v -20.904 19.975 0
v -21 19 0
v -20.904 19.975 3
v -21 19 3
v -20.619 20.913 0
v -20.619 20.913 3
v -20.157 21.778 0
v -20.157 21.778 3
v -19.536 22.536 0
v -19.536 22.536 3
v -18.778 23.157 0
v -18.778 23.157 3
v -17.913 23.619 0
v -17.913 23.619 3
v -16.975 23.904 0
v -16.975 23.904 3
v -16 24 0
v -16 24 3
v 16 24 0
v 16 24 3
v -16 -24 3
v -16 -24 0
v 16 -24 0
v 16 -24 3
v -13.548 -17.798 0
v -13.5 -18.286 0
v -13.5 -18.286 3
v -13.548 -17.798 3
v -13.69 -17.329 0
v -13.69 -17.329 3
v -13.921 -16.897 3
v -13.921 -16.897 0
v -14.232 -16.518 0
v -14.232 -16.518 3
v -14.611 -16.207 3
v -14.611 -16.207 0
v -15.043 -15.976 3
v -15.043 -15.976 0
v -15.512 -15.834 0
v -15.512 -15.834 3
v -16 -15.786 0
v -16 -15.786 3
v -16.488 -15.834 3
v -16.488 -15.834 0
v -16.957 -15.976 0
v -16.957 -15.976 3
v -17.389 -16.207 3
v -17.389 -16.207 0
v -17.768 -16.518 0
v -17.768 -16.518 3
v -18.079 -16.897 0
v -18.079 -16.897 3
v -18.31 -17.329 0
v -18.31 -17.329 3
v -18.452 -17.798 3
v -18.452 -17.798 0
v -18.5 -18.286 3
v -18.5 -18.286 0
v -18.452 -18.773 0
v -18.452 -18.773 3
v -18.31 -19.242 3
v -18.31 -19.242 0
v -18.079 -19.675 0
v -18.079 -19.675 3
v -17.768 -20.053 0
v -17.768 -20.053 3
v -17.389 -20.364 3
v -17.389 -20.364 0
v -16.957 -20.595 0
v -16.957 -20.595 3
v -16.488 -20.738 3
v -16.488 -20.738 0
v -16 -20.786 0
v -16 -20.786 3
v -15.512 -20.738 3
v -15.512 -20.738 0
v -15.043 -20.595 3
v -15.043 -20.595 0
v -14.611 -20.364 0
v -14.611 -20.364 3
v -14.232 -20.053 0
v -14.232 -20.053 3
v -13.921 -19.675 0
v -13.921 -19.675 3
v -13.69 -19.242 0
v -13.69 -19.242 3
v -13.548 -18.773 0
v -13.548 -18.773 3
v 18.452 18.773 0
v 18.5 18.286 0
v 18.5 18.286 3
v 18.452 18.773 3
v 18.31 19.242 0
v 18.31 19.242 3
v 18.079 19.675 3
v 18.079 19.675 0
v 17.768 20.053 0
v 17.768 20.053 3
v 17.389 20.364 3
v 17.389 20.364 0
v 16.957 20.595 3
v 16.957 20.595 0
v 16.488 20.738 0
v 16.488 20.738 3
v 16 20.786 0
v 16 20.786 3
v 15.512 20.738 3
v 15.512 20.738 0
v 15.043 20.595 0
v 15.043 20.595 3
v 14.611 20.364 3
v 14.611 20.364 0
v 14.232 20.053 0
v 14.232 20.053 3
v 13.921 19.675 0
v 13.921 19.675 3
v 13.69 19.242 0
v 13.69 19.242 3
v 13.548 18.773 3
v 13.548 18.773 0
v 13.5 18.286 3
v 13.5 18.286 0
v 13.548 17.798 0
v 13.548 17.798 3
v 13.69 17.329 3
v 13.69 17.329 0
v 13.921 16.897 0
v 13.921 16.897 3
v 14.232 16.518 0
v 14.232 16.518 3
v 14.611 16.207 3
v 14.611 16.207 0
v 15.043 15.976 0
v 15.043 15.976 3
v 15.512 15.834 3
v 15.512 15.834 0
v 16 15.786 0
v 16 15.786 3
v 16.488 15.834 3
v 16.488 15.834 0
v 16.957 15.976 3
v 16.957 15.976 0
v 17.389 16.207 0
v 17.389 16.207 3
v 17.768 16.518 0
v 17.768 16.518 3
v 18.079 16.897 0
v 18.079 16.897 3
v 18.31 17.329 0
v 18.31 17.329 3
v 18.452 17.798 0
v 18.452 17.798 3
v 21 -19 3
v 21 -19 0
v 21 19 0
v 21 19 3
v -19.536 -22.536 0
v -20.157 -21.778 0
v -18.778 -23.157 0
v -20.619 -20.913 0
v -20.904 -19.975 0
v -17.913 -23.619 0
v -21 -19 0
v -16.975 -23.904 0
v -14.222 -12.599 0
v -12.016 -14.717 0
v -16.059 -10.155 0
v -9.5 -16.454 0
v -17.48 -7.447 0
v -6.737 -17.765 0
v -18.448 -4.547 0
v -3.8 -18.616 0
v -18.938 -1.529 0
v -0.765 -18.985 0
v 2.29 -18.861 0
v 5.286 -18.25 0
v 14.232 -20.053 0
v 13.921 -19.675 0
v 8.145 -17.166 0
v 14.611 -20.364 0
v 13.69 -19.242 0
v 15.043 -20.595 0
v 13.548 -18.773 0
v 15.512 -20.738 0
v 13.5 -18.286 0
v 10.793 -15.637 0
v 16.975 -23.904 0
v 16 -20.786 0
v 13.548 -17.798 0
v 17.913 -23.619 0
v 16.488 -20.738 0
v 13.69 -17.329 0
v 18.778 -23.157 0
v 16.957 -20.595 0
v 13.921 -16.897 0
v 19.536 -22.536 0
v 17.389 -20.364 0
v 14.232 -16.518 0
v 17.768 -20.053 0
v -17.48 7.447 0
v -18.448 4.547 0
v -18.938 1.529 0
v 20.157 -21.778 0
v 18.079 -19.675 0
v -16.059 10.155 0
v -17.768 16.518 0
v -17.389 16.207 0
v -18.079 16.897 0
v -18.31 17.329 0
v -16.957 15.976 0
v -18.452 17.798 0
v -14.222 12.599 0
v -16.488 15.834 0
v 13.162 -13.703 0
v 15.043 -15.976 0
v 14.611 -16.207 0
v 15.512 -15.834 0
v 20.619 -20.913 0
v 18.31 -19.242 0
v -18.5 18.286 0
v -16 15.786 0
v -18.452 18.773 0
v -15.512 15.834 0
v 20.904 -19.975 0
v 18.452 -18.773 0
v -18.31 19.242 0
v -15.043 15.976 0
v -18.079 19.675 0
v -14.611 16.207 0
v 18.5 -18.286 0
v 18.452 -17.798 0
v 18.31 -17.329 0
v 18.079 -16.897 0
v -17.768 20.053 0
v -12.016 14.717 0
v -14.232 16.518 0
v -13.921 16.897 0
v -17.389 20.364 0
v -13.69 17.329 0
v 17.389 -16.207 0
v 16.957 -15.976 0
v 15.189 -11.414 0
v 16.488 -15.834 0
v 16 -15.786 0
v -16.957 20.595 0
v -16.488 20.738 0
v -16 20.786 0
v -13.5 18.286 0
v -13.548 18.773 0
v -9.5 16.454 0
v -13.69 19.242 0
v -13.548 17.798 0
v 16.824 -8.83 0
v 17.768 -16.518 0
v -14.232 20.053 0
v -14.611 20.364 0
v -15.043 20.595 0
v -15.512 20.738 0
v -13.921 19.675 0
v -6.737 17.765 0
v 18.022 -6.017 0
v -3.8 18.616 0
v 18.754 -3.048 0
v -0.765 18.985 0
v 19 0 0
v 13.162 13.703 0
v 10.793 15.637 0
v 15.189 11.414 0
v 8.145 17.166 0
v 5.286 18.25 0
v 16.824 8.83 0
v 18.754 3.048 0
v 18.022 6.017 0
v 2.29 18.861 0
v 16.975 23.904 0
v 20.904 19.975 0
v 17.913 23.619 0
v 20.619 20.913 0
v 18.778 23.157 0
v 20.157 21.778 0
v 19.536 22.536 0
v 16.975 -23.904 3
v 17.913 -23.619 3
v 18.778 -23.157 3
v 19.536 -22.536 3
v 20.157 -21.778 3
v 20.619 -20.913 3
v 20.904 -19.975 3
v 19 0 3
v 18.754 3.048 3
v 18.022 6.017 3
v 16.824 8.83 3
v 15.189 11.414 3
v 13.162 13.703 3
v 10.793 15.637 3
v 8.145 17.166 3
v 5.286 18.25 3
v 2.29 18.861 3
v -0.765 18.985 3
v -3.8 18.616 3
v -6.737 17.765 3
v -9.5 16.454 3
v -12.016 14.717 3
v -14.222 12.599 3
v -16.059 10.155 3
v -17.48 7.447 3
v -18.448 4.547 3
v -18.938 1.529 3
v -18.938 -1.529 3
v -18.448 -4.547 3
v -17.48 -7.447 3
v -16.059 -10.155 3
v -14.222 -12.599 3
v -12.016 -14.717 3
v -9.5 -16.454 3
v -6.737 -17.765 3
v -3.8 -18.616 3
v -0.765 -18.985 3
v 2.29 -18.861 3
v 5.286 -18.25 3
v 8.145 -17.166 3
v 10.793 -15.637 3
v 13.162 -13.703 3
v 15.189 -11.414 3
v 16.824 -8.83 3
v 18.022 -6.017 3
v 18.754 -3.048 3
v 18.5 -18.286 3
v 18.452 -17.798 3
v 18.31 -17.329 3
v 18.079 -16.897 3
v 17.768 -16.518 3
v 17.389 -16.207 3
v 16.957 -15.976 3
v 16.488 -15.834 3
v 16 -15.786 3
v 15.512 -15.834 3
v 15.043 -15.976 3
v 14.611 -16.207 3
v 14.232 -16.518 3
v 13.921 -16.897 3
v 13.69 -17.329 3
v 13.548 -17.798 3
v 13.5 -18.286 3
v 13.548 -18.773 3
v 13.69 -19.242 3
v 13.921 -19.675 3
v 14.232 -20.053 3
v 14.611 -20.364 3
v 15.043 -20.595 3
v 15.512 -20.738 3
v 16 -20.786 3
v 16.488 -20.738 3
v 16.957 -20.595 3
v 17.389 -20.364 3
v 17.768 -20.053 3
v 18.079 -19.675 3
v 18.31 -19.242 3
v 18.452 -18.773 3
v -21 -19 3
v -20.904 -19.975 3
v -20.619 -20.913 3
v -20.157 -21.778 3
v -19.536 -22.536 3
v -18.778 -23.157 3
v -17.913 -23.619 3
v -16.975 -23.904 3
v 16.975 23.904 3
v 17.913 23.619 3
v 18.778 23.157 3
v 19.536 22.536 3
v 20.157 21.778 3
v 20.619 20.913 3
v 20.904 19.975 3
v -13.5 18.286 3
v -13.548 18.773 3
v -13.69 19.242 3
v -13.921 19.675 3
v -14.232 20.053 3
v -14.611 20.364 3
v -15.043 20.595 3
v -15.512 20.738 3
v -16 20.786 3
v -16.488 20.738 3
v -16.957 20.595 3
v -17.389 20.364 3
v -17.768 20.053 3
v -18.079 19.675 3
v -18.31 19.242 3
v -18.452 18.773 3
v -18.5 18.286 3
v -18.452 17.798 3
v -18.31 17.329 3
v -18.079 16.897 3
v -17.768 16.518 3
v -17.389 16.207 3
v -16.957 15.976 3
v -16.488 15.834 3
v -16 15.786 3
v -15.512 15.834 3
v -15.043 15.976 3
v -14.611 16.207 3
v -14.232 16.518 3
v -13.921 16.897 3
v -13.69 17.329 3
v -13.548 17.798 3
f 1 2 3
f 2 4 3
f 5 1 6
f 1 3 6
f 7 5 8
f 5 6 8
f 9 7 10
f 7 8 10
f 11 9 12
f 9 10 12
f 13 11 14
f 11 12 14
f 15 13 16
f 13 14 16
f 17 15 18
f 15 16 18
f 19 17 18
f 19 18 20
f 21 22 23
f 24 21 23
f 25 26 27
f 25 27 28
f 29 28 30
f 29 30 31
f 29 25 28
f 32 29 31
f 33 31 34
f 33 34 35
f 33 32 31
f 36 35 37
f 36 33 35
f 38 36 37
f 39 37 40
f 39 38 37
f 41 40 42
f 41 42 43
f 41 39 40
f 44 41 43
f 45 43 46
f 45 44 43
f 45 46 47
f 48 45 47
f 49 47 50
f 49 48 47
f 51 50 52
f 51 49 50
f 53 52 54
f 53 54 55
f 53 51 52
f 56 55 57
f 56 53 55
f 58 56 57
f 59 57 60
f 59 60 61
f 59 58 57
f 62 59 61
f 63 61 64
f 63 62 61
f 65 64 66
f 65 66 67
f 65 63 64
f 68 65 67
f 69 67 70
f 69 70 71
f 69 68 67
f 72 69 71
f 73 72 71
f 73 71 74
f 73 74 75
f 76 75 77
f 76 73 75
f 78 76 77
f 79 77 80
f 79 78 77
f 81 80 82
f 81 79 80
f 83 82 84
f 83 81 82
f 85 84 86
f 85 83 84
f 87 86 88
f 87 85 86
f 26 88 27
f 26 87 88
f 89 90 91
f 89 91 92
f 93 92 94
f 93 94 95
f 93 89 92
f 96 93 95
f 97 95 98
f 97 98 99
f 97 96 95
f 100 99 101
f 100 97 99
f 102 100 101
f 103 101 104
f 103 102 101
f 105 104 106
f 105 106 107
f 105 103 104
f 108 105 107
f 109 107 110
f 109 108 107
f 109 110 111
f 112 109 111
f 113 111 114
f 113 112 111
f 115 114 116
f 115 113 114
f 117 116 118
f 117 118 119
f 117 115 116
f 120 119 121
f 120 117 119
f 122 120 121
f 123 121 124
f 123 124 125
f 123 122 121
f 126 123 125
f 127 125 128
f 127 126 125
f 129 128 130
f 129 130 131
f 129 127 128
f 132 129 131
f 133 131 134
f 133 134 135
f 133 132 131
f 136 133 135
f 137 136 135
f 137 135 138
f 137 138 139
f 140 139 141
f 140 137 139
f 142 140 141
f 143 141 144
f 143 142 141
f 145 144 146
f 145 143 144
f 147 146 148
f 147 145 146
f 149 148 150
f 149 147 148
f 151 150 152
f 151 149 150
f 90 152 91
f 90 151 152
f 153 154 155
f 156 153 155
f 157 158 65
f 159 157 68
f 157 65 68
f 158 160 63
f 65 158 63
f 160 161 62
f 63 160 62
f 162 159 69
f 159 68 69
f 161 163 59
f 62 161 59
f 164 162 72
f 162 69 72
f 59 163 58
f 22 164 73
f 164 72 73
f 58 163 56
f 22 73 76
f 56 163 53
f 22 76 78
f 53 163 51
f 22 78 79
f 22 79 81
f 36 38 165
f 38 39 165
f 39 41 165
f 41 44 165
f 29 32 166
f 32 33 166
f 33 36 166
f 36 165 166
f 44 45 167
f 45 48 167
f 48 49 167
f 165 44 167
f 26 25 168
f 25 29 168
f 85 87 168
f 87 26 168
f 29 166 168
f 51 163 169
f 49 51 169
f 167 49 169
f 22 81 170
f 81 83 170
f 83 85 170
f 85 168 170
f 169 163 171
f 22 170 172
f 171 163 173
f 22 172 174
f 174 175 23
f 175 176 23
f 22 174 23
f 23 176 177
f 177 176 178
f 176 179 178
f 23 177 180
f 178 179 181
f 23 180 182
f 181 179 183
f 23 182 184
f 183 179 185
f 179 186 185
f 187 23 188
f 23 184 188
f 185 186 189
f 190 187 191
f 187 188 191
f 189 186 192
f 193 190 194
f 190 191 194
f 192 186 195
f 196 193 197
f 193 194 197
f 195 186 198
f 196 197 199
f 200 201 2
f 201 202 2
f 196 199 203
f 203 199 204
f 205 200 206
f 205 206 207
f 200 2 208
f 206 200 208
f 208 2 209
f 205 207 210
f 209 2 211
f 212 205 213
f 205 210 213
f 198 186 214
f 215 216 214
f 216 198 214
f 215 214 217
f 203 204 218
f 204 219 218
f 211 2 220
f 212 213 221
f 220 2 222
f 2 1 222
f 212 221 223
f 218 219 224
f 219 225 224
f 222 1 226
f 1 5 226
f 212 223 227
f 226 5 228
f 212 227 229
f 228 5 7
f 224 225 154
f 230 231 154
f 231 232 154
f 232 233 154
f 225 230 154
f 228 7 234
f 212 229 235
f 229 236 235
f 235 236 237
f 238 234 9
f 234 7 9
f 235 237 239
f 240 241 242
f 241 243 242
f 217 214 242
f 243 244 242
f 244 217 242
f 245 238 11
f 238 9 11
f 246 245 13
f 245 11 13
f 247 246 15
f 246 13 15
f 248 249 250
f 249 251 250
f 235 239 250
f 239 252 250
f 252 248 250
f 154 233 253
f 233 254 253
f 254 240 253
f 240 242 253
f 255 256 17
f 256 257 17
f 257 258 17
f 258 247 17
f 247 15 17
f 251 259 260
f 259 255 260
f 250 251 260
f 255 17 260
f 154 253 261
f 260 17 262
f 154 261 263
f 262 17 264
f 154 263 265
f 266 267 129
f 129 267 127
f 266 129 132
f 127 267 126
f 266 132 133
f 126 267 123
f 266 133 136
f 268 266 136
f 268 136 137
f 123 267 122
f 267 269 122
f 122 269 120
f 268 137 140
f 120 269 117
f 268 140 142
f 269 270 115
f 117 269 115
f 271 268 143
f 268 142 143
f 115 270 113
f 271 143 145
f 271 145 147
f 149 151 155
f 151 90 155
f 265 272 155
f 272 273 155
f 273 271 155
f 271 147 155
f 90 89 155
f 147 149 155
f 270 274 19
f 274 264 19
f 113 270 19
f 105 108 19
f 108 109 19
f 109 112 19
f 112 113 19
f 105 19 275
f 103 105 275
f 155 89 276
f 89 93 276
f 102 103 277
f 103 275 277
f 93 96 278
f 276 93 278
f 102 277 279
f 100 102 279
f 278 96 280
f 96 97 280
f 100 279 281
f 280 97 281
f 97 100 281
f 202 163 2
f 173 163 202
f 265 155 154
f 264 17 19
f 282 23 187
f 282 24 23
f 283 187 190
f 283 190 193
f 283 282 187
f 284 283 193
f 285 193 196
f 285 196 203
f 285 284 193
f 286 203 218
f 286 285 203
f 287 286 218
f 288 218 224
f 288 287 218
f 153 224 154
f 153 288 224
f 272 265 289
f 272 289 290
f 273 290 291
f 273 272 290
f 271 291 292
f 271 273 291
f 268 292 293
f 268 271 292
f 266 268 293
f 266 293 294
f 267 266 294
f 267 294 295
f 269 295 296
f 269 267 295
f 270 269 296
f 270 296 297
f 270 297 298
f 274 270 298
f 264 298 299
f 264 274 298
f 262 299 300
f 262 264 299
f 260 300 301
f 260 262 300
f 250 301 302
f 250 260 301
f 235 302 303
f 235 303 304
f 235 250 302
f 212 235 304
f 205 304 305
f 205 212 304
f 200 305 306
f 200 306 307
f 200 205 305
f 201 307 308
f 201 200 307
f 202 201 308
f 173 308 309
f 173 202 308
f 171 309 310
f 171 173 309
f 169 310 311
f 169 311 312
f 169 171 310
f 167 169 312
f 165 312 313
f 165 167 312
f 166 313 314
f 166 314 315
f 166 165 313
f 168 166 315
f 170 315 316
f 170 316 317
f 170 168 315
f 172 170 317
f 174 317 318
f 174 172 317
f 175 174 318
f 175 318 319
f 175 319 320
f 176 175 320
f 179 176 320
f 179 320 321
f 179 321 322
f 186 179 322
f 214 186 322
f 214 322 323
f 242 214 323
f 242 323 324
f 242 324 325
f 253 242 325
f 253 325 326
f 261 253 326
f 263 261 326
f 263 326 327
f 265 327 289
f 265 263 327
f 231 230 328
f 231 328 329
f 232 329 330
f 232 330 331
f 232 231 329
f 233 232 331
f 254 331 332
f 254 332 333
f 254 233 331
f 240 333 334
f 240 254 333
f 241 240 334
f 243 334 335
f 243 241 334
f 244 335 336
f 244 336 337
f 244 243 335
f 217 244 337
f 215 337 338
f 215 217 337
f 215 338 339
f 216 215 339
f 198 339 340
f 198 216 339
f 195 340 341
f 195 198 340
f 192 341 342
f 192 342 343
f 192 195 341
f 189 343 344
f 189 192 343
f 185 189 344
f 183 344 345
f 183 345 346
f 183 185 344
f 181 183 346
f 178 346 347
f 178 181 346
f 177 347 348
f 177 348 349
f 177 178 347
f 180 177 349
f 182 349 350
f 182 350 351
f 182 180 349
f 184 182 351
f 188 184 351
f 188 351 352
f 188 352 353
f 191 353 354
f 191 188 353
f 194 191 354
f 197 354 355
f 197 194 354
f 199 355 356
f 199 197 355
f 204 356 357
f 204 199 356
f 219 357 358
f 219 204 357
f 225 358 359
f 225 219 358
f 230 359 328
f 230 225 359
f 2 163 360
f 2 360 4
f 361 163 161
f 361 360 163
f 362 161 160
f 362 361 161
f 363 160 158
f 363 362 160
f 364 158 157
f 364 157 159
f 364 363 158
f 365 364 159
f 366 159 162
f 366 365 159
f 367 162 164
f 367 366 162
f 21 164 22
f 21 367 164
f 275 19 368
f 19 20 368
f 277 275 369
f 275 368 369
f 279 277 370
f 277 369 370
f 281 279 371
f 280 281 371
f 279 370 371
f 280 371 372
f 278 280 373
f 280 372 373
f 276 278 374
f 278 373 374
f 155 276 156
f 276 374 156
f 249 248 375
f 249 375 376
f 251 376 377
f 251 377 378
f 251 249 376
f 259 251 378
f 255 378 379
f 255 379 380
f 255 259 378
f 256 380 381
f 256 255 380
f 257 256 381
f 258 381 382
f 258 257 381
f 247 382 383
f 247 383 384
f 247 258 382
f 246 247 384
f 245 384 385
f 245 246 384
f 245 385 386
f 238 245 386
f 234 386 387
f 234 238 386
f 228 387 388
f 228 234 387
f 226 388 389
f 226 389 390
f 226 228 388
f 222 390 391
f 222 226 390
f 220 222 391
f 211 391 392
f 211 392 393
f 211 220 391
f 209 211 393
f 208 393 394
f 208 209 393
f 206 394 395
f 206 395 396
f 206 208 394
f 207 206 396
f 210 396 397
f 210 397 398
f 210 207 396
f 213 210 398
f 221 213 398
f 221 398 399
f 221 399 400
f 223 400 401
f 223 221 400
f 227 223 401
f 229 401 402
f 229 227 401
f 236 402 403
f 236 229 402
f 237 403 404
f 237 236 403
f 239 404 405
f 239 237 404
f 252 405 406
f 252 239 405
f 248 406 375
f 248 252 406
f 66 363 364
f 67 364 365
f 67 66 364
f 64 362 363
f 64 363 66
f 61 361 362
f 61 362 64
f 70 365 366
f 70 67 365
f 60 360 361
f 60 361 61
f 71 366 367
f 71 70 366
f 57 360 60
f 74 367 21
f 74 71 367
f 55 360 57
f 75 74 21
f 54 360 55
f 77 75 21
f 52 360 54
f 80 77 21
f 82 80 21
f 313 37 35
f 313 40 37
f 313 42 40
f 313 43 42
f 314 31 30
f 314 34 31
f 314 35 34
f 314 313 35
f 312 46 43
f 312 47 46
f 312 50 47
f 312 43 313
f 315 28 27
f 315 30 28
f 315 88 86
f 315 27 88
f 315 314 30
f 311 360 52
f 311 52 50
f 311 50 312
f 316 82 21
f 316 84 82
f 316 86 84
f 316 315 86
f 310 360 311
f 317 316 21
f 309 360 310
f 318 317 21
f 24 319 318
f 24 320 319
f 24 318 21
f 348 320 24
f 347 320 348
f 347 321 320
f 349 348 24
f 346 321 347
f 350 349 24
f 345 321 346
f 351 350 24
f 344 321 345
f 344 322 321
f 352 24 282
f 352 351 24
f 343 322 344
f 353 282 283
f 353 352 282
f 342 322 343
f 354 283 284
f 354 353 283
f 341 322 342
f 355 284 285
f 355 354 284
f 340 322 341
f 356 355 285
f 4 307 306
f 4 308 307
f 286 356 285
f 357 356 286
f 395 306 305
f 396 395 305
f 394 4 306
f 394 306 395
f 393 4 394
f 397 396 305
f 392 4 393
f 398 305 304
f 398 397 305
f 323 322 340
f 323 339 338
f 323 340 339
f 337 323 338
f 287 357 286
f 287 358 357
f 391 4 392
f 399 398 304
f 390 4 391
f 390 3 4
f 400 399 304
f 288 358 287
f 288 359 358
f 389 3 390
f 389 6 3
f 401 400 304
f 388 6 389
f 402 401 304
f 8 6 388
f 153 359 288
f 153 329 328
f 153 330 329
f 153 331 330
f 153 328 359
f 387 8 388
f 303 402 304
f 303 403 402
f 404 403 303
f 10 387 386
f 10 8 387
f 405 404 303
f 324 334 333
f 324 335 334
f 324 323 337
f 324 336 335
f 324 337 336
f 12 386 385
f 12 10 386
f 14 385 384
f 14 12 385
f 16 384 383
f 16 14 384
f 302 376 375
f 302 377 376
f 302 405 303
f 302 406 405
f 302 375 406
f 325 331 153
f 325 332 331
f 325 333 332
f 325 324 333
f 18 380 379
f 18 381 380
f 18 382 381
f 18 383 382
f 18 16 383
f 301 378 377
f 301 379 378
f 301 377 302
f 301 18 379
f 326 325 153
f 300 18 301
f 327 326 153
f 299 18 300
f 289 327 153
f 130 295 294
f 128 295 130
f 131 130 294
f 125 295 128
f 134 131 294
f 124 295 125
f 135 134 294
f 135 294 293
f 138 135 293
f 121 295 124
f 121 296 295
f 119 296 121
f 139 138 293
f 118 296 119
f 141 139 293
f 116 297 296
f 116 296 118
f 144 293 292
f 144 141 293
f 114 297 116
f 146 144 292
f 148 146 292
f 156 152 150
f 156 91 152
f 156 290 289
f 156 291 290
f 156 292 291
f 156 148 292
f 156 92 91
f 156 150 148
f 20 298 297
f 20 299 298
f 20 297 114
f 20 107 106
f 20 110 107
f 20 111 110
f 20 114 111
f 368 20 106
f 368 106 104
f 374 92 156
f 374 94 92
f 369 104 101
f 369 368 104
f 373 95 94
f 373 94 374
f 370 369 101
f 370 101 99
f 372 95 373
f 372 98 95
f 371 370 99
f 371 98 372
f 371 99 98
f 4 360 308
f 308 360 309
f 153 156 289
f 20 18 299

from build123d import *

# Parameters (mm, degrees)
SKETCH1_W           = 42
SKETCH1_H           = 48
SKETCH1_R           = 19
SKETCH1_R_2         = 2.5
BOSS_EXTRUDE1_DEPTH = 3
FILLET1_R           = 5


with BuildPart() as part:
    # Sketch1 → Boss-Extrude1 (new body)
    with BuildSketch(Plane.XY):
        Rectangle(SKETCH1_W, SKETCH1_H)
        Circle(SKETCH1_R, mode=Mode.SUBTRACT)
        with Locations((-16, 18.285714286)):
            Circle(SKETCH1_R_2, mode=Mode.SUBTRACT)
        with Locations((16, 18.285714286)):
            Circle(SKETCH1_R_2, mode=Mode.SUBTRACT)
        with Locations((16, -18.285714286)):
            Circle(SKETCH1_R_2, mode=Mode.SUBTRACT)
        with Locations((-16, -18.285714286)):
            Circle(SKETCH1_R_2, mode=Mode.SUBTRACT)
    extrude(amount=BOSS_EXTRUDE1_DEPTH)

    # Fillet1
    fillet1_edges = [part.edges().sort_by_distance(p)[0] for p in [
        (21, -24, 1.5),
        (-21, -24, 1.5),
        (-21, 24, 1.5),
        (21, 24, 1.5),
    ]]
    fillet(fillet1_edges, radius=FILLET1_R)


solid = part.part
